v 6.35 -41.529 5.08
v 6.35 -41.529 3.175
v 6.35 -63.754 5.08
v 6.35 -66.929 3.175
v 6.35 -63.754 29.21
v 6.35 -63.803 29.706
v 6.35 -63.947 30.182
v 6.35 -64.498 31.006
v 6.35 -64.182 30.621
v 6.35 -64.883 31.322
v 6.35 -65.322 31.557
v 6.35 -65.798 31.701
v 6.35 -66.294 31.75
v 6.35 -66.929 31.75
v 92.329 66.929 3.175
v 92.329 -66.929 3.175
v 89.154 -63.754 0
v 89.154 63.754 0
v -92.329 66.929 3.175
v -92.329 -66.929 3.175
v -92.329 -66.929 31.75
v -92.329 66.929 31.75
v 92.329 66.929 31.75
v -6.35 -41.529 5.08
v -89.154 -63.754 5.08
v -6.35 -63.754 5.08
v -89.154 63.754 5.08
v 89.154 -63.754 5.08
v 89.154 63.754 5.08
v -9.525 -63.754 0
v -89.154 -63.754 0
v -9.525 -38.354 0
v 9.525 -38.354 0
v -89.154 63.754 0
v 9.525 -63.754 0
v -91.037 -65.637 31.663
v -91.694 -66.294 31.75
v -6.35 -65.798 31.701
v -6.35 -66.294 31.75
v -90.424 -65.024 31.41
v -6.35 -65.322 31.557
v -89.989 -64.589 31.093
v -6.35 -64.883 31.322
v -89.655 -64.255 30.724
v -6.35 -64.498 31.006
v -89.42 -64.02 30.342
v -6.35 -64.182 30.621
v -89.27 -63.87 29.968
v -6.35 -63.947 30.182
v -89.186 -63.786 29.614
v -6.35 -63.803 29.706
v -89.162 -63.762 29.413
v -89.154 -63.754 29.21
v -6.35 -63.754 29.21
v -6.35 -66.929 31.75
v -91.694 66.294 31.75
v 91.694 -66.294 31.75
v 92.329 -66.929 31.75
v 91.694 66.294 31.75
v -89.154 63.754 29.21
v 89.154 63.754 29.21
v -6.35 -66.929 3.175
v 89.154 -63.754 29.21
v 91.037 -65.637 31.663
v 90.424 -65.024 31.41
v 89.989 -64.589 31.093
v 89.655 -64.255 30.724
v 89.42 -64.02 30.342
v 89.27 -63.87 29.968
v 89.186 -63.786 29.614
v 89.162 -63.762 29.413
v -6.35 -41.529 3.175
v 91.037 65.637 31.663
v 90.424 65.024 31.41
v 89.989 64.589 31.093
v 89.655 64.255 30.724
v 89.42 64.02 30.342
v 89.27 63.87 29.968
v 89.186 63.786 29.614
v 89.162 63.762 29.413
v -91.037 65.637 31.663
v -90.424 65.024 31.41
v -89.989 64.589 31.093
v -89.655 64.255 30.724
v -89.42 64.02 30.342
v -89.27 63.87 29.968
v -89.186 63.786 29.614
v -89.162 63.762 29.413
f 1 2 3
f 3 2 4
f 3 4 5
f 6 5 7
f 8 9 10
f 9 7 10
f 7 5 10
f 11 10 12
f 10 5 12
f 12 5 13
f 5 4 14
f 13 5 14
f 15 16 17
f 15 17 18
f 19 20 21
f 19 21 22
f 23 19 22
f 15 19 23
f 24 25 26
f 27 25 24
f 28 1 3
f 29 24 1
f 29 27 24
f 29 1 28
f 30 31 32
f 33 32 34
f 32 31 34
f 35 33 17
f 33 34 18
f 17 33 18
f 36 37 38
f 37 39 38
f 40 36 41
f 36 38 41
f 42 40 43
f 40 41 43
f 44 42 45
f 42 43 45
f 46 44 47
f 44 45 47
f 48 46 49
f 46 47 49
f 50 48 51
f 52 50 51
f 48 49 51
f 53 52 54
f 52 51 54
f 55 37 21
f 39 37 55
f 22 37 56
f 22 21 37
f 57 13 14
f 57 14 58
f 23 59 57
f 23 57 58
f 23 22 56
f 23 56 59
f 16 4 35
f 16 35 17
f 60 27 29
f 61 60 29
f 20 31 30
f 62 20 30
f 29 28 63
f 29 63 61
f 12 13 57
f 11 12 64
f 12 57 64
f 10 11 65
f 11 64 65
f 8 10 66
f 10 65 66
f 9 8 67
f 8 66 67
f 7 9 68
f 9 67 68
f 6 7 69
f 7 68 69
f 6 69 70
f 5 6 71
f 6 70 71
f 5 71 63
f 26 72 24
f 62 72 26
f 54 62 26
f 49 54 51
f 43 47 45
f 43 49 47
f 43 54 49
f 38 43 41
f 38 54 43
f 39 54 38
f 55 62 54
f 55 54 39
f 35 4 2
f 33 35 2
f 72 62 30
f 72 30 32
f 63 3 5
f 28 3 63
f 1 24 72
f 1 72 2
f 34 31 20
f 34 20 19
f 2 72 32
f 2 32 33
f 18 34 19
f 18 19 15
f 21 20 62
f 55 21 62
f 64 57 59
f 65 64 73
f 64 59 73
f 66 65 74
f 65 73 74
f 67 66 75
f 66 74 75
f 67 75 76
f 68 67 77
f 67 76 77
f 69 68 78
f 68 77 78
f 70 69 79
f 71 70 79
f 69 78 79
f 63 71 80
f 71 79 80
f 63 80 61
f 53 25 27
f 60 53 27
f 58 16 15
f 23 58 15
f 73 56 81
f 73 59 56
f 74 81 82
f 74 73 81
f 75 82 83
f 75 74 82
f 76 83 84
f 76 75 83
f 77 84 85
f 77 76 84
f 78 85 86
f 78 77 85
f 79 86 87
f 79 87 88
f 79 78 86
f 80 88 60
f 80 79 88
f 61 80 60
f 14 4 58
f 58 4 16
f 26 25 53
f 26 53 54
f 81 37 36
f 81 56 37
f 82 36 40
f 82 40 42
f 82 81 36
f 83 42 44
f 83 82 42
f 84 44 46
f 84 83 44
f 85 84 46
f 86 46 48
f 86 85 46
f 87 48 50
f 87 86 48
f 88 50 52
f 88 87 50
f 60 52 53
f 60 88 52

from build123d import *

# Parameters (mm, degrees)
F0_W     = 184.658
F0_H     = 133.858
F1_DEPTH = 5.08
F2_W     = 184.658
F2_H     = 133.858
F2_W_2   = 178.308
F2_H_2   = 127.508
F3_DEPTH = 31.75
F4_W     = 12.7
F4_H     = 31.75
F5_DEPTH = 25.4
F6_SIZE2 = 3.175
F6_SIZE  = 3.175
F7_R     = 2.54


with BuildPart() as f1:
    # F0 (on Top) → F1 (new body)
    with BuildSketch(Plane.XY):
        Rectangle(F0_W, F0_H)
    extrude(amount=F1_DEPTH)

    # F2 (on Top) → F3 (join)
    with BuildSketch(Plane.XY):
        Rectangle(F2_W, F2_H)
        Rectangle(F2_W_2, F2_H_2, mode=Mode.SUBTRACT)
    extrude(amount=F3_DEPTH)

    # F4 (on face) → F5 (cut)
    with BuildSketch(Plane.XZ.offset(66.929)):
        with Locations((0, 15.875)):
            Rectangle(F4_W, F4_H)
    extrude(amount=-F5_DEPTH, mode=Mode.SUBTRACT)

    # F6
    f6_edges = [f1.edges().sort_by_distance(p)[0] for p in [
        (49.3395, -66.929, 0),
        (6.35, -54.229, 0),
        (0, -41.529, 0),
        (-6.35, -54.229, 0),
        (-49.3395, -66.929, 0),
        (-92.329, 0, 0),
        (0, 66.929, 0),
        (92.329, 0, 0),
    ]]
    chamfer(f6_edges, length=F6_SIZE, length2=F6_SIZE2)

    # F7
    f7_edges = [f1.edges().sort_by_distance(p)[0] for p in [
        (47.752, -63.754, 31.75),
        (-47.752, -63.754, 31.75),
        (89.154, 0, 31.75),
        (-89.154, 0, 31.75),
        (0, 63.754, 31.75),
    ]]
    fillet(f7_edges, radius=F7_R)


solid = f1.part
